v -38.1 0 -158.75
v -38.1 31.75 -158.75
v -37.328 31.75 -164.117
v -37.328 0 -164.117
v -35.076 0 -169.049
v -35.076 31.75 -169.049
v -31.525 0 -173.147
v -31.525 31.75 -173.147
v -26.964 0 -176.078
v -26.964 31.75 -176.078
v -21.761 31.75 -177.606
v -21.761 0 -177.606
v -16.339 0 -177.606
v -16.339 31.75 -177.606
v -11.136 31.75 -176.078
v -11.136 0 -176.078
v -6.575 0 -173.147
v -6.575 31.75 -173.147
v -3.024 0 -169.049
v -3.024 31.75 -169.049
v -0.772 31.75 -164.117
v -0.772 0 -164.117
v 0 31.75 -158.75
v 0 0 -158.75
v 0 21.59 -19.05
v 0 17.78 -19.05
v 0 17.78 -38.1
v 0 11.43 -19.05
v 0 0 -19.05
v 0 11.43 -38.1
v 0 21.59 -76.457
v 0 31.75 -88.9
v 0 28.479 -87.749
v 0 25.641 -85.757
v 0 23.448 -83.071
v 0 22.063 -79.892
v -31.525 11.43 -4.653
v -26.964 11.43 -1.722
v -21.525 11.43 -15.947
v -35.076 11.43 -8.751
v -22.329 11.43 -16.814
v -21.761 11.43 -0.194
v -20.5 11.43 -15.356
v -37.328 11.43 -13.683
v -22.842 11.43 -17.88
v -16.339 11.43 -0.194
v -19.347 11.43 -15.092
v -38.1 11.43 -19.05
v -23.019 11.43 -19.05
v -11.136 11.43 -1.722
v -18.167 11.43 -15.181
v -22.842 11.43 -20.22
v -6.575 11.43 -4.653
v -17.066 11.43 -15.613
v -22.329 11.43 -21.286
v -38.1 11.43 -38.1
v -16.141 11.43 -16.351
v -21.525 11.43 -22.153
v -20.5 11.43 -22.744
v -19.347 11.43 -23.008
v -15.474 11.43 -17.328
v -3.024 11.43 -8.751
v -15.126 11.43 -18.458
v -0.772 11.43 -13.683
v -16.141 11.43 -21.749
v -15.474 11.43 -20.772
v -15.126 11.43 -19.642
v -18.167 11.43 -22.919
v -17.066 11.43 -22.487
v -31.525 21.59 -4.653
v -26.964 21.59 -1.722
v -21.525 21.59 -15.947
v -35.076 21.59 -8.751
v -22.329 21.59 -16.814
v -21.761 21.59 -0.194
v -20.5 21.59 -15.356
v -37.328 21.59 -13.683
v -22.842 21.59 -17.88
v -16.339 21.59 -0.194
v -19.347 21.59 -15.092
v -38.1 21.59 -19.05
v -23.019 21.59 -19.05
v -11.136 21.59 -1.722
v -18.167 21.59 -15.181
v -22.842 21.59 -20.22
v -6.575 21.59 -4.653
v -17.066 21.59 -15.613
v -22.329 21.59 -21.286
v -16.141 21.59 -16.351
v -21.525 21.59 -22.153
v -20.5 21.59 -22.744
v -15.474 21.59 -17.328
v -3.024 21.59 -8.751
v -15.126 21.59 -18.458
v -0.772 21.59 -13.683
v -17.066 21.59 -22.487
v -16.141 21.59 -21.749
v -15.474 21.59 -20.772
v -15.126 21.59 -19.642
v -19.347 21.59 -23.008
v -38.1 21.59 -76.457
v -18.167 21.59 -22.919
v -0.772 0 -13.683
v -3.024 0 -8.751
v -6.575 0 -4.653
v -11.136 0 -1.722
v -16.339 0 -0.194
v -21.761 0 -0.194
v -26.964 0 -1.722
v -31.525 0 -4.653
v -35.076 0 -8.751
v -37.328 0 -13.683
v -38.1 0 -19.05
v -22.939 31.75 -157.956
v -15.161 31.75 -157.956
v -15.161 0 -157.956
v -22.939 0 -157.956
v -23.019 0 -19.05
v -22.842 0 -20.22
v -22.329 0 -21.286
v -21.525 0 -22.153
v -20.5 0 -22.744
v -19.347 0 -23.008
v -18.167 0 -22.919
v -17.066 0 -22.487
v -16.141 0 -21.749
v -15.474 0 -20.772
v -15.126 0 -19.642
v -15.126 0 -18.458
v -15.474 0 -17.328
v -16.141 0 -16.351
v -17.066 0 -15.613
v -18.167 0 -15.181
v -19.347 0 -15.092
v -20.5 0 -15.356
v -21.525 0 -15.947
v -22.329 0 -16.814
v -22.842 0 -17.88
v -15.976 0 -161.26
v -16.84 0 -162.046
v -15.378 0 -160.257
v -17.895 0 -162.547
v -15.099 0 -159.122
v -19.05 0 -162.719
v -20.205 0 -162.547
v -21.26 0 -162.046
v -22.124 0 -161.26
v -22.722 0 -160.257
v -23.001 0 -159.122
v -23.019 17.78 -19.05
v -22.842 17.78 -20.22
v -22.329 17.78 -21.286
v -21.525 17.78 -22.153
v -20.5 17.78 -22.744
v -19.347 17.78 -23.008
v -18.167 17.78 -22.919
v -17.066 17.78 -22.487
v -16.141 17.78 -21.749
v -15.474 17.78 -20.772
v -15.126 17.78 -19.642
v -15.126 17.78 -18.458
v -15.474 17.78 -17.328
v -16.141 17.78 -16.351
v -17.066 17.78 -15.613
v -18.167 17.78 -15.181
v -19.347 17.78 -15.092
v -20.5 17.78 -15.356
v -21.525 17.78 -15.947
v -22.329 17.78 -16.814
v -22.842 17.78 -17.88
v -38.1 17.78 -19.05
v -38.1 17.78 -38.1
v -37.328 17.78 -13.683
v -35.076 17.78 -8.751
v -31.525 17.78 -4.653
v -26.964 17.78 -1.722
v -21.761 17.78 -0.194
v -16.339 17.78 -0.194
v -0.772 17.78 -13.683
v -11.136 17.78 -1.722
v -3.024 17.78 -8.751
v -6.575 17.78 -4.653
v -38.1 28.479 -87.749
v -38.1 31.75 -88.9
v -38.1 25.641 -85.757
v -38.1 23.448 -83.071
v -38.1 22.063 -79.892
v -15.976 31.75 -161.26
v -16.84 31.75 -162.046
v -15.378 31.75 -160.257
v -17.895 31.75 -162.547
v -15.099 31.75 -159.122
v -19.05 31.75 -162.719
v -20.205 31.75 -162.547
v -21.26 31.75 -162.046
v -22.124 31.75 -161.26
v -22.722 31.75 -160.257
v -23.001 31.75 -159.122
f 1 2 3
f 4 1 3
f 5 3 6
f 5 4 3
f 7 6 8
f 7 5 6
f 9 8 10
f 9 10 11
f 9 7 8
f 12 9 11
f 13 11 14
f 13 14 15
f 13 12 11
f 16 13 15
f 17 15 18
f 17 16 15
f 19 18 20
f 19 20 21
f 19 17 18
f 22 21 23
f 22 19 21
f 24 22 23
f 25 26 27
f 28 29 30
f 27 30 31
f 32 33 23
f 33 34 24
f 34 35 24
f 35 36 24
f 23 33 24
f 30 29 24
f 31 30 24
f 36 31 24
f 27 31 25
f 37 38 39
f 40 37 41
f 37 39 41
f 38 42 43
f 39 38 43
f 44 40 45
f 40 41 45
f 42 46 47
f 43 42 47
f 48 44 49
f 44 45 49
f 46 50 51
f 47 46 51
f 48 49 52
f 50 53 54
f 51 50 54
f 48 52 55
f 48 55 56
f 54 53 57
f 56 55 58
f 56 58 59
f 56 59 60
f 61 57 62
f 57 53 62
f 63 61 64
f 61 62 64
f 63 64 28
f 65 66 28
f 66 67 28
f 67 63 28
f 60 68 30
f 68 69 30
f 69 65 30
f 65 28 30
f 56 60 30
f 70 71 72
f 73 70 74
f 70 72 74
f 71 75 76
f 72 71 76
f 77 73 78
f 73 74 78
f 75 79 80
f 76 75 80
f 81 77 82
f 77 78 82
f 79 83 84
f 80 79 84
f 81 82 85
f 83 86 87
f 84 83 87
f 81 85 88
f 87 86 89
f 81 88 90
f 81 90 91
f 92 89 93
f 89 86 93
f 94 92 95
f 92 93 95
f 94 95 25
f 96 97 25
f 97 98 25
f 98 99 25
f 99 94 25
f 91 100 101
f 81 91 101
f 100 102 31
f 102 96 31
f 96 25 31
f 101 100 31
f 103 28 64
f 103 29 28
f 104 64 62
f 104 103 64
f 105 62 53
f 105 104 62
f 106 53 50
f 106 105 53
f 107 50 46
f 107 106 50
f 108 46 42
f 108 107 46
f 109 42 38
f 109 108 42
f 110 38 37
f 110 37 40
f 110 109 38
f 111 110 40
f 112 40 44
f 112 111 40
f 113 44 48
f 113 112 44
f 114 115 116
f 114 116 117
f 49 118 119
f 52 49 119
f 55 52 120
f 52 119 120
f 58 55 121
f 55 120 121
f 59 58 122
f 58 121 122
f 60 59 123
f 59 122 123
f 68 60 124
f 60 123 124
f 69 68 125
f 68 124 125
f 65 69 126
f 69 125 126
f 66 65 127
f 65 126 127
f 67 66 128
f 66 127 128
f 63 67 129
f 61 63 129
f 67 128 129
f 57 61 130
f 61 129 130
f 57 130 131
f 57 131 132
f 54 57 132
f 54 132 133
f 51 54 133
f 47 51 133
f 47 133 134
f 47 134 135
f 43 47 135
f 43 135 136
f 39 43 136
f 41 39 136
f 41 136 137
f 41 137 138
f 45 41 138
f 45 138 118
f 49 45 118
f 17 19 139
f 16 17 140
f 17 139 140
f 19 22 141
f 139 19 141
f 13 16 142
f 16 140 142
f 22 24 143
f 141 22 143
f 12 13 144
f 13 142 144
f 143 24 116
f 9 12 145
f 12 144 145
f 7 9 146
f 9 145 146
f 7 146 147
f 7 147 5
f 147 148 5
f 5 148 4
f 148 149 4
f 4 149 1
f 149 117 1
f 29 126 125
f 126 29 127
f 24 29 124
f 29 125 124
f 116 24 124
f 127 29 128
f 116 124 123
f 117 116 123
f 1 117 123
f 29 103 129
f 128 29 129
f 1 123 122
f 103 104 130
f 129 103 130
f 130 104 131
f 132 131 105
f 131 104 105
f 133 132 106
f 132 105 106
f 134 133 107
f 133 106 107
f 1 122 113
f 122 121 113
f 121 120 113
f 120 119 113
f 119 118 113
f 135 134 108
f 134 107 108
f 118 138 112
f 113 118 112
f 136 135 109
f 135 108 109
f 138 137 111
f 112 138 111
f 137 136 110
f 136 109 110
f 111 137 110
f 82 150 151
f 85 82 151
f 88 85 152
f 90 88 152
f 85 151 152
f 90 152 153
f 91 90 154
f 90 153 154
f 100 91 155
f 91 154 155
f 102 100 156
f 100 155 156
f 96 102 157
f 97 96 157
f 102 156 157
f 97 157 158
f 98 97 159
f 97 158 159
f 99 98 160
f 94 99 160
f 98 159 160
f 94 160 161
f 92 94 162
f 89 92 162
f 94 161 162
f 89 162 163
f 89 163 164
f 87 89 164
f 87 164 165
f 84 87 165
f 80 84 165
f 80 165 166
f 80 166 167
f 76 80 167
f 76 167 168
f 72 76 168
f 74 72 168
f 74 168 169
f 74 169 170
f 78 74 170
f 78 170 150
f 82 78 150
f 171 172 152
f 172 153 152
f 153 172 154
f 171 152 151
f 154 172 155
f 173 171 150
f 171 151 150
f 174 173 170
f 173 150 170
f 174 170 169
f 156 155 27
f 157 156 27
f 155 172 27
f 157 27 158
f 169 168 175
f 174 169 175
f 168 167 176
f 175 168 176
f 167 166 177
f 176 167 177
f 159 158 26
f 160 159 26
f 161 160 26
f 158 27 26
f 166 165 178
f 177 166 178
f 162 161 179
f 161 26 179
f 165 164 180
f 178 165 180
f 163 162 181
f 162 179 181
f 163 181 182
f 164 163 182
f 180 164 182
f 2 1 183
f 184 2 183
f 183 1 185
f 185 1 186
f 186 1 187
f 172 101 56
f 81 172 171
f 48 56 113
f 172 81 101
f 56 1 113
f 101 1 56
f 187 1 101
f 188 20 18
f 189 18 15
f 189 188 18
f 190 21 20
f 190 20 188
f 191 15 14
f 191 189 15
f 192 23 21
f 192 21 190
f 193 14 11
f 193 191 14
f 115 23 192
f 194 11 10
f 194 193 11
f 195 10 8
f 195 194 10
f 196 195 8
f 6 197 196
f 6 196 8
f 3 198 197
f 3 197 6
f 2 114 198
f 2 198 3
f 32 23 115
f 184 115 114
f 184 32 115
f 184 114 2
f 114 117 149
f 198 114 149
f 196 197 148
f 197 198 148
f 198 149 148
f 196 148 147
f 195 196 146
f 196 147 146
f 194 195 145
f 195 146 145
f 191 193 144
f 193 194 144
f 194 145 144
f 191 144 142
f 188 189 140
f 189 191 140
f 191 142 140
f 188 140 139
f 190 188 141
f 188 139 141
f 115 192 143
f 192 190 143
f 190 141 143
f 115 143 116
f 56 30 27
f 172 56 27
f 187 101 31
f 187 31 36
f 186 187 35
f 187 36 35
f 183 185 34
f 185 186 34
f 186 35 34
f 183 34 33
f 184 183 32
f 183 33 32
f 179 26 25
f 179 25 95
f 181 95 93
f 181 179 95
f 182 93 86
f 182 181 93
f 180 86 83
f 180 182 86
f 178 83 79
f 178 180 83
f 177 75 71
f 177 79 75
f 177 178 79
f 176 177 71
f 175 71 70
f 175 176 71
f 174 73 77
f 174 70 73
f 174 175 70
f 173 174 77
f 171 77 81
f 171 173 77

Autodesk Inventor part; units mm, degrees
ref_plane "YZ Plane" through (0, 0, 0) normal (1, 0, 0) x (0, 1, 0)
ref_plane "XZ Plane" through (0, 0, 0) normal (0, 1, 0) x (-1, 0, 0)
ref_plane "XY Plane" through (0, 0, 0) normal (0, 0, 1) x (1, 0, 0)
sketch "Sketch1" plane through (0, 0, 0) normal (0, 1, 0) x (-1, 0, 0)
  line L0 (0, -19.05) -> (0, -158.75)
  line L1 (19.05, -177.8) -> (19.05, -177.8)
  line L2 (38.1, -158.75) -> (38.1, -19.05)
  line L3 (19.05, 0) -> (19.05, 0)
  arc A0 (0, -158.75) -> (19.05, -177.8) centre (19.05, -158.75) ccw
  arc A1 (19.05, -177.8) -> (38.1, -158.75) centre (19.05, -158.75) ccw
  arc A2 (38.1, -19.05) -> (19.05, 0) centre (19.05, -19.05) ccw
  arc A3 (19.05, 0) -> (0, -19.05) centre (19.05, -19.05) ccw
  circle A4 centre (19.05, -19.05) radius 3.9688
  circle A5 centre (19.05, -158.75) radius 3.9688
  point P0 (0, 0)
  point P1 (0, -177.8)
  point P2 (38.1, -177.8)
  dimension "d0" = 38.1
  dimension "LengthOfArm_Thicker" = 177.8
  dimension "d2" = 19.05
  dimension "d3" = 7.9375
  dimension "Motor_Shaft_Diameter" = 7.9375
extrude "Extrusion1" add sketch "Sketch1" along normal blind 31.75
sketch "Sketch3" plane through (0, 0, -19.05) normal (1, 0, 0) x (0, 0, -1)
  line L0 (-57.15, 11.43) -> (19.05, 11.43)
  line L1 (19.05, 11.43) -> (19.05, 17.78)
  line L2 (19.05, 17.78) -> (-57.15, 17.78)
  line L3 (-57.15, 17.78) -> (-57.15, 11.43)
  line L4 (-19.05, 0) -> (-19.05, 31.75) projected
  line L5 (-57.15, 11.43) -> (19.05, 17.78) construction
  line L6 (19.05, 11.43) -> (-57.15, 17.78) construction
  line L7 (0, 0) -> (-19.05, 0) projected
  line L8 (-19.05, 0) -> (-19.05, 31.75) projected
  line L9 (-19.05, 21.59) -> (69.85, 21.59)
  line L10 (69.85, 21.59) -> (69.85, 31.75)
  line L11 (139.7, 31.75) -> (0, 31.75) projected
  line L12 (0, 31.75) -> (-19.05, 31.75) projected
  line L13 (69.85, 31.75) -> (-19.05, 31.75)
  line L14 (-19.05, 0) -> (-19.05, 31.75) projected
  line L15 (-19.05, 31.75) -> (-19.05, 21.59)
  point P0 (-19.05, 14.605)
  point P1 (-19.05, 14.605)
  dimension "d15" = 6.35
  dimension "d19" = 11.43
  dimension "d20" = 10.16
  dimension "d21" = 88.9
extrude "Extrusion3" cut sketch "Sketch3" against normal up to next
fillet "Fillet3" radius 12.7 1 edges at (-19.05, 21.59, -88.9)
sketch "Sketch4" plane through (0, 31.75, 0) normal (0, 1, 0) x (1, 0, 0)
  circle A0 centre (-19.05, 158.75) radius 3.9687 projected
  line L0 (-9.6345, 157.9562) -> (-28.4655, 157.9562)
  line L1 (-28.4655, 157.9562) -> (-28.4655, 151.6062)
  line L2 (-28.4655, 151.6062) -> (-9.6345, 151.6062)
  line L3 (-9.6345, 151.6062) -> (-9.6345, 157.9562)
  line L4 (-9.6345, 157.9562) -> (-28.4655, 151.6062) construction
  line L5 (-28.4655, 157.9562) -> (-9.6345, 151.6062) construction
  point P0 (0, 0)
  point P1 (-19.05, 154.7812)
  dimension "d23" = 6.35
extrude "Extrusion4" add sketch "Sketch4" against normal up to surface (31.75 mm away) contours L0 A0 | A0 L0 L3 L2 L1 picked at (-18.2787, 156.5235)
equation "\"Thickness_Thicker\" = 2 * Thickness_Thiner"
equation "\"Thickness_Thiner\" = 15.875"
properties part number "ArmThicker"
